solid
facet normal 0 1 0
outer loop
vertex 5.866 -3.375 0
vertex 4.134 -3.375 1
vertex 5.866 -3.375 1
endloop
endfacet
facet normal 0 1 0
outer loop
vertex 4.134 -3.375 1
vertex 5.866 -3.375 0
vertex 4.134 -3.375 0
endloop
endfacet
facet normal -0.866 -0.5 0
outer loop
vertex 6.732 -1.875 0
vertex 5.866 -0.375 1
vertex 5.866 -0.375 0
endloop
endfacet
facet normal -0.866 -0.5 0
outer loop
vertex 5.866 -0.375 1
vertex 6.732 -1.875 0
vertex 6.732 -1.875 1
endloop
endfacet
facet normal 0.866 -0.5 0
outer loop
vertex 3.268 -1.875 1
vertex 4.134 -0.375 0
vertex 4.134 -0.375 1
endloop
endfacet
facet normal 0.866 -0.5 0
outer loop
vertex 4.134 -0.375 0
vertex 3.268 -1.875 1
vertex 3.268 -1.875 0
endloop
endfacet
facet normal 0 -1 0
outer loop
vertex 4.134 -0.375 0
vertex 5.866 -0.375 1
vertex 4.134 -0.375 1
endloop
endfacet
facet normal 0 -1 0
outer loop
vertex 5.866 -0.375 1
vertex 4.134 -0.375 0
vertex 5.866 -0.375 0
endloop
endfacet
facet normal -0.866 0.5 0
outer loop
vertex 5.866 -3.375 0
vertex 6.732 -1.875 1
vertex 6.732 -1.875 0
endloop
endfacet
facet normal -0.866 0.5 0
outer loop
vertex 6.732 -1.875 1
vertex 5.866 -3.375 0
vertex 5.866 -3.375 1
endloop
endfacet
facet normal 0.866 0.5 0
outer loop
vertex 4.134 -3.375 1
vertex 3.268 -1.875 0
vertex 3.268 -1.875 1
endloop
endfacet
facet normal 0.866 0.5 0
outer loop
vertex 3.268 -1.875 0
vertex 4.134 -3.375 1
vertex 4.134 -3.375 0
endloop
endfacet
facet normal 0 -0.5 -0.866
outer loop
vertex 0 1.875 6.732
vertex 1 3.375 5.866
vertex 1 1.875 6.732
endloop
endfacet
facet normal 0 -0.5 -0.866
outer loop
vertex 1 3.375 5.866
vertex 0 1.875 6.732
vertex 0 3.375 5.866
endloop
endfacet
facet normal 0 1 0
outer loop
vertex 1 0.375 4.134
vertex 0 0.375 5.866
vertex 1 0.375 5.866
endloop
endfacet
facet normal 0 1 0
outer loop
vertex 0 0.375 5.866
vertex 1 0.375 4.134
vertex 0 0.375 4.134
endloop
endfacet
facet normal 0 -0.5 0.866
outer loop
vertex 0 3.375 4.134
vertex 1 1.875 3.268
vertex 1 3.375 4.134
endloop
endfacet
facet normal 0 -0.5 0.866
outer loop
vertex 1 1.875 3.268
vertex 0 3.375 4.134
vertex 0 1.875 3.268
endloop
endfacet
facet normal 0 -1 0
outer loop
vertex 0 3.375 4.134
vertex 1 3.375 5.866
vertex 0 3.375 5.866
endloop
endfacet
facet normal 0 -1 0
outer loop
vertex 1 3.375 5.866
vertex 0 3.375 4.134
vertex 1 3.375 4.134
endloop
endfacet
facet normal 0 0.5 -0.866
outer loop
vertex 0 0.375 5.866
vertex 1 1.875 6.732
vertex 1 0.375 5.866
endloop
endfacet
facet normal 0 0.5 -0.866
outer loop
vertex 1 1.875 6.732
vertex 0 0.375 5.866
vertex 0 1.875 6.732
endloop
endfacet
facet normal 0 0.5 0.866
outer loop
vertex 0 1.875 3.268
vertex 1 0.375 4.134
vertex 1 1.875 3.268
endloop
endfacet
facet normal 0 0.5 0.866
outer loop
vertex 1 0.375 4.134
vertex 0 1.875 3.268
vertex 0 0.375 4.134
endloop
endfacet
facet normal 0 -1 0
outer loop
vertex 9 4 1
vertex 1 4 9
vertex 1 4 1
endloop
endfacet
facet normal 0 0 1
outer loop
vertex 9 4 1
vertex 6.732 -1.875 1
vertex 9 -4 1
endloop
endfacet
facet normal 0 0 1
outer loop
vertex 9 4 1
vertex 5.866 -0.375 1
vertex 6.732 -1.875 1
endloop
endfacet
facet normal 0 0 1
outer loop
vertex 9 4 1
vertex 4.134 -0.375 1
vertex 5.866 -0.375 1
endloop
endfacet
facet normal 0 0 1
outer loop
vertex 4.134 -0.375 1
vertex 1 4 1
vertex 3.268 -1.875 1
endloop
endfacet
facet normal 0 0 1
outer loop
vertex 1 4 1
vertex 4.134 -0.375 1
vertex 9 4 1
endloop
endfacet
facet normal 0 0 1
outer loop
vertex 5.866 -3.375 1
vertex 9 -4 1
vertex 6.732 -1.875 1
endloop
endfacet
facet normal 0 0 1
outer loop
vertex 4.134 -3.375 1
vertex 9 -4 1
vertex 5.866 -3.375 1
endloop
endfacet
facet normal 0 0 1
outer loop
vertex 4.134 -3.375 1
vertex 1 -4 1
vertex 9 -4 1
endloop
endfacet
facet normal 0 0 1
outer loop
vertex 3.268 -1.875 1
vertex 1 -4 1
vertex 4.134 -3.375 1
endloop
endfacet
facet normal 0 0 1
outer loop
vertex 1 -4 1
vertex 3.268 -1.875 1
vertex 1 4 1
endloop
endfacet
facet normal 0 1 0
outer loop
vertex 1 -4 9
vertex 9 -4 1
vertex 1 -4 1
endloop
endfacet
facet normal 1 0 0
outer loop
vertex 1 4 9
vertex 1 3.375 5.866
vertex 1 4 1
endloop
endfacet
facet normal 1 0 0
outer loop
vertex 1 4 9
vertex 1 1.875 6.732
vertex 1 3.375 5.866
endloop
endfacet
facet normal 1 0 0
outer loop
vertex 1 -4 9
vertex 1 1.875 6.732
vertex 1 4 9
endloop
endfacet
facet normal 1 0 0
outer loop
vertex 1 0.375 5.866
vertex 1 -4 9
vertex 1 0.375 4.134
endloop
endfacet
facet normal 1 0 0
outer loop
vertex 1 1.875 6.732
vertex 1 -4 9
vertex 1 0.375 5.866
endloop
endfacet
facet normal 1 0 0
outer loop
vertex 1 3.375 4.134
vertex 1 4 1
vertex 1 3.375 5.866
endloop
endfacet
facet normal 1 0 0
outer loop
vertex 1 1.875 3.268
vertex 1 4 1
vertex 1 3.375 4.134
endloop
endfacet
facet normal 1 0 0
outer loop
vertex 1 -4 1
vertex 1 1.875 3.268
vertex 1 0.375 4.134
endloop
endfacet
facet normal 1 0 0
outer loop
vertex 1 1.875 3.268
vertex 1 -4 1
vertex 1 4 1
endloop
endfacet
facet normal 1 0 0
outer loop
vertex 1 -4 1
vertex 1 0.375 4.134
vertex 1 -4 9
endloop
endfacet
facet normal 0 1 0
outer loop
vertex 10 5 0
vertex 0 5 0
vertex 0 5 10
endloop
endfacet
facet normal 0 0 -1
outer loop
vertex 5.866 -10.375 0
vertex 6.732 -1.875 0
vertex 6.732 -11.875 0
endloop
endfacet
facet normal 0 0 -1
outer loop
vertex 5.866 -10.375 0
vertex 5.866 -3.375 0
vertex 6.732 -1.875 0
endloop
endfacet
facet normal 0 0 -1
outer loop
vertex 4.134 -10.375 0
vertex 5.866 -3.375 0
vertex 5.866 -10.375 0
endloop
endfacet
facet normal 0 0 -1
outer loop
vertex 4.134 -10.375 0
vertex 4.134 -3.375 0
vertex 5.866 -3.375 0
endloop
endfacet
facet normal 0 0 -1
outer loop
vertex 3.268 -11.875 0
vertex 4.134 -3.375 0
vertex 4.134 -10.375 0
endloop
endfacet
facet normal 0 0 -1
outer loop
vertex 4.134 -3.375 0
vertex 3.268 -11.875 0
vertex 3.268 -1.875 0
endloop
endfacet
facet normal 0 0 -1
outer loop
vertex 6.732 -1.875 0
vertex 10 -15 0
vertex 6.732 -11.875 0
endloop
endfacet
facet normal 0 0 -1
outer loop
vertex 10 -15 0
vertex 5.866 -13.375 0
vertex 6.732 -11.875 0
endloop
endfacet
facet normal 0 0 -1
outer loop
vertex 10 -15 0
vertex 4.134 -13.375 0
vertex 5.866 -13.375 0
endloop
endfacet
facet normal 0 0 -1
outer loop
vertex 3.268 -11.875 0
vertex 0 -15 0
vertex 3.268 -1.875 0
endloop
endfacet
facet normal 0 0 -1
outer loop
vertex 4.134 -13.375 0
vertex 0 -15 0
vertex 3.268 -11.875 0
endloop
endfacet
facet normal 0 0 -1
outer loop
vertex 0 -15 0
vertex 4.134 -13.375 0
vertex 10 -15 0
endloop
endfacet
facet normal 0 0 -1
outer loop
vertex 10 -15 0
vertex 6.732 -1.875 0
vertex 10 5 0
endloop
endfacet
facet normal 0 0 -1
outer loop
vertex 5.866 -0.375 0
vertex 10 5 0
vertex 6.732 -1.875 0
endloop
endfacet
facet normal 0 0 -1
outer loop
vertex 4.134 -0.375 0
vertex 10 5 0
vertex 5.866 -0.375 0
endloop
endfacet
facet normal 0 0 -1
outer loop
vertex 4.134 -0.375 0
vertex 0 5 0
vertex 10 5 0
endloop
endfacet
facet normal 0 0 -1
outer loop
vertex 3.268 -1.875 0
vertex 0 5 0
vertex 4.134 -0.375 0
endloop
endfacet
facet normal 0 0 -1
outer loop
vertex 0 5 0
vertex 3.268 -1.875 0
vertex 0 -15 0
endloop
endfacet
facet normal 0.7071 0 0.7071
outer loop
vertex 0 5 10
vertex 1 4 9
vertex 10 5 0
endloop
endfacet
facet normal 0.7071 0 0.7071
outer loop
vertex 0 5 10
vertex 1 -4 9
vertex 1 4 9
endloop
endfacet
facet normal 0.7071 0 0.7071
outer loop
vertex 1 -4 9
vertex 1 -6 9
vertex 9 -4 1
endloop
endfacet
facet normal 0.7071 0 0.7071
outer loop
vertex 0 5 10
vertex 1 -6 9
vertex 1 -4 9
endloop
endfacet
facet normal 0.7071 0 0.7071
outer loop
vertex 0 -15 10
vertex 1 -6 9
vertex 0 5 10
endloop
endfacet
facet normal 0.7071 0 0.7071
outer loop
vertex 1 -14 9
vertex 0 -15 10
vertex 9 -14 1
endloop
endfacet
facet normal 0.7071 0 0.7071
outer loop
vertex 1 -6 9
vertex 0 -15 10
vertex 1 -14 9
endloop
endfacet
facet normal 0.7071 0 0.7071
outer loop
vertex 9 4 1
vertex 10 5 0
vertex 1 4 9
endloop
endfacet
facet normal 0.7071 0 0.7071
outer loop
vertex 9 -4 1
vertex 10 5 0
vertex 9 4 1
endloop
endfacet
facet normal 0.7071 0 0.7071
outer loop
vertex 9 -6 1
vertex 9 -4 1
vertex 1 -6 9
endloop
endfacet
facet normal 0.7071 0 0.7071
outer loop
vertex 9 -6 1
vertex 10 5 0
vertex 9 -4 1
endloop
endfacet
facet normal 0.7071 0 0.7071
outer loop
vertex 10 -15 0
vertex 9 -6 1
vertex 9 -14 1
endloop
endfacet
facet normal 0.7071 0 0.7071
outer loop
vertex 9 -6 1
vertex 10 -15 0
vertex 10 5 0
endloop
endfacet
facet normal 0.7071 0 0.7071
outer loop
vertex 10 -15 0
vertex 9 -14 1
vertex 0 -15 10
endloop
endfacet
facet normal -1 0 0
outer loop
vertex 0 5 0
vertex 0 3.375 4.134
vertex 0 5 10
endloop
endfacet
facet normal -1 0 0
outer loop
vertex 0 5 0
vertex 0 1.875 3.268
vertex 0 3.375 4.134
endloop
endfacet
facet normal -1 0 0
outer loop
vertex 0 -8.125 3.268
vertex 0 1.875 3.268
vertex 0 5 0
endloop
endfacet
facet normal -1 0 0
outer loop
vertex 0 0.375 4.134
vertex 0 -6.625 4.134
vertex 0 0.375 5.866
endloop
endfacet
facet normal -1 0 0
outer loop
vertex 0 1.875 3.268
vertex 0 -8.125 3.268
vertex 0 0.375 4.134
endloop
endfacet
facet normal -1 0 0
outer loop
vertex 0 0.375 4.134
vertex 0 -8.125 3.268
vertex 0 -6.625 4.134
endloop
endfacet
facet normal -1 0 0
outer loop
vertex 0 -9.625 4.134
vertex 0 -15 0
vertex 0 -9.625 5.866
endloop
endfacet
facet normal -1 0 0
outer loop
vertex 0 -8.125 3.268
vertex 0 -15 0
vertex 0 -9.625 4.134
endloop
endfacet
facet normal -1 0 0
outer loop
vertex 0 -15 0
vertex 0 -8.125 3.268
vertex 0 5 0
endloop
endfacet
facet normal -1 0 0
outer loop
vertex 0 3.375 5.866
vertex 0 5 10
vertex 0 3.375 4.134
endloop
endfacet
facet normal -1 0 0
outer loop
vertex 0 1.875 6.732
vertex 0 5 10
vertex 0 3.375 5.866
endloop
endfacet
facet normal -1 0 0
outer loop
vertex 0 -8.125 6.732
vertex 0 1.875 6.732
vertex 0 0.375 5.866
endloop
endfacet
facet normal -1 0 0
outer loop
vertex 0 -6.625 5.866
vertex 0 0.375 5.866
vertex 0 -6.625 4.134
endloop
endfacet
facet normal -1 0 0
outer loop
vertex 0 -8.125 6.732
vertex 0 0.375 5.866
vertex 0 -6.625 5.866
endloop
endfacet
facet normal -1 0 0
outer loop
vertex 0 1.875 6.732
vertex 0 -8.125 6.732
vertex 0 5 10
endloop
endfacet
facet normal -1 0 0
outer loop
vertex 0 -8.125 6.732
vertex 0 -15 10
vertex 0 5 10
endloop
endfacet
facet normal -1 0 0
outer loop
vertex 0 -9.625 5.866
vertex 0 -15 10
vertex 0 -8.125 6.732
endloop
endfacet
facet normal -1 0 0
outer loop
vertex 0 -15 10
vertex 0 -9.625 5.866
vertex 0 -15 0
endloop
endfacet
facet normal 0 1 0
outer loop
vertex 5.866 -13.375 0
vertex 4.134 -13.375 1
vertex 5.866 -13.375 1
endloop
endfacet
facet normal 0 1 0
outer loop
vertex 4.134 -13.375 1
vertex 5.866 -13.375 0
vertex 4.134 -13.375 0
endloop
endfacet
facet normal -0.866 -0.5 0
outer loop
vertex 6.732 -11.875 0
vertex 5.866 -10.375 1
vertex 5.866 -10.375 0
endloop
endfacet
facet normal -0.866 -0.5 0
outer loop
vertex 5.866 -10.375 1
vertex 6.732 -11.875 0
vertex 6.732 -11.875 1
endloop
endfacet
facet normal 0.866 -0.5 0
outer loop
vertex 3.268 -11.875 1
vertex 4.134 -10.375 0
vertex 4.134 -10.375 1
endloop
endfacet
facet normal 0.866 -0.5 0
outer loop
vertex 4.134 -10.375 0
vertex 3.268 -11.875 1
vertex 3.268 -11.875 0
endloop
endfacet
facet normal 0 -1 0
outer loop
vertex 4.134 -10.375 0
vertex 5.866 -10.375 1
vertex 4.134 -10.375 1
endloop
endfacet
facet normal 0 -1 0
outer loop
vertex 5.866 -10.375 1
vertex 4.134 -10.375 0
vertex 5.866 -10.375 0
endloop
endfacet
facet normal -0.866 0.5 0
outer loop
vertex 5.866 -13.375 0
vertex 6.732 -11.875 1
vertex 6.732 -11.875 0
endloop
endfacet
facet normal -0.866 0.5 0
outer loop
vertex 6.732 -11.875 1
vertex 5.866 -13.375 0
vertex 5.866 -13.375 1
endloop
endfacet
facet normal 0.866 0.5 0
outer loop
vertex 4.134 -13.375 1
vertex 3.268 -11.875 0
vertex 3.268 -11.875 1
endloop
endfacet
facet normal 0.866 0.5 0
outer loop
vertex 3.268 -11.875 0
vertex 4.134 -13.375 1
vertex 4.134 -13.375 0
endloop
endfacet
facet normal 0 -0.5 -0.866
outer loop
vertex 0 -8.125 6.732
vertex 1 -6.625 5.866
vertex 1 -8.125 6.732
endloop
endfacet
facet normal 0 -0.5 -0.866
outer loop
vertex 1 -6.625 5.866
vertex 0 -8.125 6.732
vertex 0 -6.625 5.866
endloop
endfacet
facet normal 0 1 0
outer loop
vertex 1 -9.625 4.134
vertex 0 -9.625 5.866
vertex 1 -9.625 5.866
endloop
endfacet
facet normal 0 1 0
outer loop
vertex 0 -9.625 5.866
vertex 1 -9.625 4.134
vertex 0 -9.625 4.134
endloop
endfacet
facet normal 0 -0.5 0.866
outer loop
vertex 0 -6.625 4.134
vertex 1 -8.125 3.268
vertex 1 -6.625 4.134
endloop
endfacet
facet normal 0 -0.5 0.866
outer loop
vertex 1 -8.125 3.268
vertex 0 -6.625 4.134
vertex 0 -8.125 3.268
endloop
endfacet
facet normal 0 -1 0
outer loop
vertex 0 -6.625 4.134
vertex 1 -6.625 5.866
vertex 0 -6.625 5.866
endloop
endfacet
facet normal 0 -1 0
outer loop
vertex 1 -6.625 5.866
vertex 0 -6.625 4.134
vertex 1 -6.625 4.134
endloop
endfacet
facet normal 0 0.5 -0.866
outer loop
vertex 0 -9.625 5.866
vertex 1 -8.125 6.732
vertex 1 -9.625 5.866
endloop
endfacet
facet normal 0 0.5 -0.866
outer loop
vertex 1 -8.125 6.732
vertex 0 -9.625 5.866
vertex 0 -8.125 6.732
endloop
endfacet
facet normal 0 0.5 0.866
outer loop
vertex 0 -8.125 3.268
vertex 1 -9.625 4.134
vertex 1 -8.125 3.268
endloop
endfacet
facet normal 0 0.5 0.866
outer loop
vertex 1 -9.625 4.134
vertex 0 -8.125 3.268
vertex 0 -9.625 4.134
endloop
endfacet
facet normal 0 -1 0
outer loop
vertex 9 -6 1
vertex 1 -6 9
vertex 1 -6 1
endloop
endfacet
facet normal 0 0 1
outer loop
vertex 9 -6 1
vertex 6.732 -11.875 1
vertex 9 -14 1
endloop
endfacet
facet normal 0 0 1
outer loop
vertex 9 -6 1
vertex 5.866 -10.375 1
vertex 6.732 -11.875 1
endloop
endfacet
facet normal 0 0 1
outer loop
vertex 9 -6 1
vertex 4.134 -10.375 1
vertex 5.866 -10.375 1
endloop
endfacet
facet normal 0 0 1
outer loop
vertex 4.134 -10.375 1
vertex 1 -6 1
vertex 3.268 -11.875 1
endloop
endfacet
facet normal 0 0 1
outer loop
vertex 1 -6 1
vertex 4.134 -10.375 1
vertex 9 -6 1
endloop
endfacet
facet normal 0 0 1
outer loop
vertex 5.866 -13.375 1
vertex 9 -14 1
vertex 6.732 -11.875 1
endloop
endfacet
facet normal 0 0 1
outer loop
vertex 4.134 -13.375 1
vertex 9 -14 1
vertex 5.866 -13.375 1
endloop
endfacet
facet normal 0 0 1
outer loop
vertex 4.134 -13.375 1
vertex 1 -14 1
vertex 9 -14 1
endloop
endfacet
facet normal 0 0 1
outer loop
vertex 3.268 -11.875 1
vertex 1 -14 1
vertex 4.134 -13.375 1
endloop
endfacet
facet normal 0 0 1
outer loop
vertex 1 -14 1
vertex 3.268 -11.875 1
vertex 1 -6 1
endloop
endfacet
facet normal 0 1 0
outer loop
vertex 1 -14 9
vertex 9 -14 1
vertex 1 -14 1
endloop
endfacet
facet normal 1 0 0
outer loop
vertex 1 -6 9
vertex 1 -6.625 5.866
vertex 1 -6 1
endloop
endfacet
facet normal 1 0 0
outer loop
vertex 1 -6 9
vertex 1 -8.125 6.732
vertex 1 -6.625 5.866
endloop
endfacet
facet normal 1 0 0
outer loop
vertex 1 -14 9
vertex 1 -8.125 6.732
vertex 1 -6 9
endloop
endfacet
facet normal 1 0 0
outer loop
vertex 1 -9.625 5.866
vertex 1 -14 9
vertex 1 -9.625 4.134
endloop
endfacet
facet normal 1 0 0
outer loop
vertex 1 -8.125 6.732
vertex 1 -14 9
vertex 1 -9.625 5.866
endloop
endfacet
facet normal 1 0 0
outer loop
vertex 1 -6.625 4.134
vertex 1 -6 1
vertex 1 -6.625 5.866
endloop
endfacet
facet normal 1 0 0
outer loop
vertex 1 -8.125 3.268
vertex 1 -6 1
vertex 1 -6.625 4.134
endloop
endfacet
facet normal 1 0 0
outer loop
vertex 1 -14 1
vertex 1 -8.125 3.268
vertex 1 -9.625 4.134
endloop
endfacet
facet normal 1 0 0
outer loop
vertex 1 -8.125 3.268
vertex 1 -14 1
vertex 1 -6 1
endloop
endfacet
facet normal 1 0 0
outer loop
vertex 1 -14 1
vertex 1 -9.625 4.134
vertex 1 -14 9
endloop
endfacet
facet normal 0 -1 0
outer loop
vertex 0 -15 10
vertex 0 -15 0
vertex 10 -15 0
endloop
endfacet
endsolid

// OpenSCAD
//A connector for connecting sheets at 90° angles, intended for mendel90ish things
module linear_extrude_smart(height=10,center=false,convexity=2,twist=0){
	if(height==0) child(0);
	else{
		linear_extrude(height=height,center=center,convexity=convexity,twist=twist) child(0);
	}
}
module prism(size=[10,10],h=10,center=false,convexity=2,twist=0){
	linear_extrude_smart(height=h,center=center,convexity=convexity,twist=twist)
	polygon([[0,0],[size[0],0],[0,size[1]]]);
}
module polyhole(h,d,center=false){
    n=max(round(2*d),3);
    rotate([0,0,180]) cylinder(h=h,r=(d/2)/cos(180/n),$fn=n,center=center);
}
m=3; //bolt size
w=1; //wall thickness
s=3*m+w;
rotate([90,0,0])
for(i=[0:1]) translate([0,0,s*i])
difference(){
	prism([1,1]*s,h=s,center=true);
	union(){
		translate([1,1]*w) prism([1,1]*s,h=(s-2*w),center=true);
		for(j=[0,1])
				translate([0,0,1.5*s/8]*(j==0?1:-1))
				translate([1,1,0]*s/2) rotate([90,0,90*j])
				polyhole(d=m,h=s*2,center=true);
	}
}
